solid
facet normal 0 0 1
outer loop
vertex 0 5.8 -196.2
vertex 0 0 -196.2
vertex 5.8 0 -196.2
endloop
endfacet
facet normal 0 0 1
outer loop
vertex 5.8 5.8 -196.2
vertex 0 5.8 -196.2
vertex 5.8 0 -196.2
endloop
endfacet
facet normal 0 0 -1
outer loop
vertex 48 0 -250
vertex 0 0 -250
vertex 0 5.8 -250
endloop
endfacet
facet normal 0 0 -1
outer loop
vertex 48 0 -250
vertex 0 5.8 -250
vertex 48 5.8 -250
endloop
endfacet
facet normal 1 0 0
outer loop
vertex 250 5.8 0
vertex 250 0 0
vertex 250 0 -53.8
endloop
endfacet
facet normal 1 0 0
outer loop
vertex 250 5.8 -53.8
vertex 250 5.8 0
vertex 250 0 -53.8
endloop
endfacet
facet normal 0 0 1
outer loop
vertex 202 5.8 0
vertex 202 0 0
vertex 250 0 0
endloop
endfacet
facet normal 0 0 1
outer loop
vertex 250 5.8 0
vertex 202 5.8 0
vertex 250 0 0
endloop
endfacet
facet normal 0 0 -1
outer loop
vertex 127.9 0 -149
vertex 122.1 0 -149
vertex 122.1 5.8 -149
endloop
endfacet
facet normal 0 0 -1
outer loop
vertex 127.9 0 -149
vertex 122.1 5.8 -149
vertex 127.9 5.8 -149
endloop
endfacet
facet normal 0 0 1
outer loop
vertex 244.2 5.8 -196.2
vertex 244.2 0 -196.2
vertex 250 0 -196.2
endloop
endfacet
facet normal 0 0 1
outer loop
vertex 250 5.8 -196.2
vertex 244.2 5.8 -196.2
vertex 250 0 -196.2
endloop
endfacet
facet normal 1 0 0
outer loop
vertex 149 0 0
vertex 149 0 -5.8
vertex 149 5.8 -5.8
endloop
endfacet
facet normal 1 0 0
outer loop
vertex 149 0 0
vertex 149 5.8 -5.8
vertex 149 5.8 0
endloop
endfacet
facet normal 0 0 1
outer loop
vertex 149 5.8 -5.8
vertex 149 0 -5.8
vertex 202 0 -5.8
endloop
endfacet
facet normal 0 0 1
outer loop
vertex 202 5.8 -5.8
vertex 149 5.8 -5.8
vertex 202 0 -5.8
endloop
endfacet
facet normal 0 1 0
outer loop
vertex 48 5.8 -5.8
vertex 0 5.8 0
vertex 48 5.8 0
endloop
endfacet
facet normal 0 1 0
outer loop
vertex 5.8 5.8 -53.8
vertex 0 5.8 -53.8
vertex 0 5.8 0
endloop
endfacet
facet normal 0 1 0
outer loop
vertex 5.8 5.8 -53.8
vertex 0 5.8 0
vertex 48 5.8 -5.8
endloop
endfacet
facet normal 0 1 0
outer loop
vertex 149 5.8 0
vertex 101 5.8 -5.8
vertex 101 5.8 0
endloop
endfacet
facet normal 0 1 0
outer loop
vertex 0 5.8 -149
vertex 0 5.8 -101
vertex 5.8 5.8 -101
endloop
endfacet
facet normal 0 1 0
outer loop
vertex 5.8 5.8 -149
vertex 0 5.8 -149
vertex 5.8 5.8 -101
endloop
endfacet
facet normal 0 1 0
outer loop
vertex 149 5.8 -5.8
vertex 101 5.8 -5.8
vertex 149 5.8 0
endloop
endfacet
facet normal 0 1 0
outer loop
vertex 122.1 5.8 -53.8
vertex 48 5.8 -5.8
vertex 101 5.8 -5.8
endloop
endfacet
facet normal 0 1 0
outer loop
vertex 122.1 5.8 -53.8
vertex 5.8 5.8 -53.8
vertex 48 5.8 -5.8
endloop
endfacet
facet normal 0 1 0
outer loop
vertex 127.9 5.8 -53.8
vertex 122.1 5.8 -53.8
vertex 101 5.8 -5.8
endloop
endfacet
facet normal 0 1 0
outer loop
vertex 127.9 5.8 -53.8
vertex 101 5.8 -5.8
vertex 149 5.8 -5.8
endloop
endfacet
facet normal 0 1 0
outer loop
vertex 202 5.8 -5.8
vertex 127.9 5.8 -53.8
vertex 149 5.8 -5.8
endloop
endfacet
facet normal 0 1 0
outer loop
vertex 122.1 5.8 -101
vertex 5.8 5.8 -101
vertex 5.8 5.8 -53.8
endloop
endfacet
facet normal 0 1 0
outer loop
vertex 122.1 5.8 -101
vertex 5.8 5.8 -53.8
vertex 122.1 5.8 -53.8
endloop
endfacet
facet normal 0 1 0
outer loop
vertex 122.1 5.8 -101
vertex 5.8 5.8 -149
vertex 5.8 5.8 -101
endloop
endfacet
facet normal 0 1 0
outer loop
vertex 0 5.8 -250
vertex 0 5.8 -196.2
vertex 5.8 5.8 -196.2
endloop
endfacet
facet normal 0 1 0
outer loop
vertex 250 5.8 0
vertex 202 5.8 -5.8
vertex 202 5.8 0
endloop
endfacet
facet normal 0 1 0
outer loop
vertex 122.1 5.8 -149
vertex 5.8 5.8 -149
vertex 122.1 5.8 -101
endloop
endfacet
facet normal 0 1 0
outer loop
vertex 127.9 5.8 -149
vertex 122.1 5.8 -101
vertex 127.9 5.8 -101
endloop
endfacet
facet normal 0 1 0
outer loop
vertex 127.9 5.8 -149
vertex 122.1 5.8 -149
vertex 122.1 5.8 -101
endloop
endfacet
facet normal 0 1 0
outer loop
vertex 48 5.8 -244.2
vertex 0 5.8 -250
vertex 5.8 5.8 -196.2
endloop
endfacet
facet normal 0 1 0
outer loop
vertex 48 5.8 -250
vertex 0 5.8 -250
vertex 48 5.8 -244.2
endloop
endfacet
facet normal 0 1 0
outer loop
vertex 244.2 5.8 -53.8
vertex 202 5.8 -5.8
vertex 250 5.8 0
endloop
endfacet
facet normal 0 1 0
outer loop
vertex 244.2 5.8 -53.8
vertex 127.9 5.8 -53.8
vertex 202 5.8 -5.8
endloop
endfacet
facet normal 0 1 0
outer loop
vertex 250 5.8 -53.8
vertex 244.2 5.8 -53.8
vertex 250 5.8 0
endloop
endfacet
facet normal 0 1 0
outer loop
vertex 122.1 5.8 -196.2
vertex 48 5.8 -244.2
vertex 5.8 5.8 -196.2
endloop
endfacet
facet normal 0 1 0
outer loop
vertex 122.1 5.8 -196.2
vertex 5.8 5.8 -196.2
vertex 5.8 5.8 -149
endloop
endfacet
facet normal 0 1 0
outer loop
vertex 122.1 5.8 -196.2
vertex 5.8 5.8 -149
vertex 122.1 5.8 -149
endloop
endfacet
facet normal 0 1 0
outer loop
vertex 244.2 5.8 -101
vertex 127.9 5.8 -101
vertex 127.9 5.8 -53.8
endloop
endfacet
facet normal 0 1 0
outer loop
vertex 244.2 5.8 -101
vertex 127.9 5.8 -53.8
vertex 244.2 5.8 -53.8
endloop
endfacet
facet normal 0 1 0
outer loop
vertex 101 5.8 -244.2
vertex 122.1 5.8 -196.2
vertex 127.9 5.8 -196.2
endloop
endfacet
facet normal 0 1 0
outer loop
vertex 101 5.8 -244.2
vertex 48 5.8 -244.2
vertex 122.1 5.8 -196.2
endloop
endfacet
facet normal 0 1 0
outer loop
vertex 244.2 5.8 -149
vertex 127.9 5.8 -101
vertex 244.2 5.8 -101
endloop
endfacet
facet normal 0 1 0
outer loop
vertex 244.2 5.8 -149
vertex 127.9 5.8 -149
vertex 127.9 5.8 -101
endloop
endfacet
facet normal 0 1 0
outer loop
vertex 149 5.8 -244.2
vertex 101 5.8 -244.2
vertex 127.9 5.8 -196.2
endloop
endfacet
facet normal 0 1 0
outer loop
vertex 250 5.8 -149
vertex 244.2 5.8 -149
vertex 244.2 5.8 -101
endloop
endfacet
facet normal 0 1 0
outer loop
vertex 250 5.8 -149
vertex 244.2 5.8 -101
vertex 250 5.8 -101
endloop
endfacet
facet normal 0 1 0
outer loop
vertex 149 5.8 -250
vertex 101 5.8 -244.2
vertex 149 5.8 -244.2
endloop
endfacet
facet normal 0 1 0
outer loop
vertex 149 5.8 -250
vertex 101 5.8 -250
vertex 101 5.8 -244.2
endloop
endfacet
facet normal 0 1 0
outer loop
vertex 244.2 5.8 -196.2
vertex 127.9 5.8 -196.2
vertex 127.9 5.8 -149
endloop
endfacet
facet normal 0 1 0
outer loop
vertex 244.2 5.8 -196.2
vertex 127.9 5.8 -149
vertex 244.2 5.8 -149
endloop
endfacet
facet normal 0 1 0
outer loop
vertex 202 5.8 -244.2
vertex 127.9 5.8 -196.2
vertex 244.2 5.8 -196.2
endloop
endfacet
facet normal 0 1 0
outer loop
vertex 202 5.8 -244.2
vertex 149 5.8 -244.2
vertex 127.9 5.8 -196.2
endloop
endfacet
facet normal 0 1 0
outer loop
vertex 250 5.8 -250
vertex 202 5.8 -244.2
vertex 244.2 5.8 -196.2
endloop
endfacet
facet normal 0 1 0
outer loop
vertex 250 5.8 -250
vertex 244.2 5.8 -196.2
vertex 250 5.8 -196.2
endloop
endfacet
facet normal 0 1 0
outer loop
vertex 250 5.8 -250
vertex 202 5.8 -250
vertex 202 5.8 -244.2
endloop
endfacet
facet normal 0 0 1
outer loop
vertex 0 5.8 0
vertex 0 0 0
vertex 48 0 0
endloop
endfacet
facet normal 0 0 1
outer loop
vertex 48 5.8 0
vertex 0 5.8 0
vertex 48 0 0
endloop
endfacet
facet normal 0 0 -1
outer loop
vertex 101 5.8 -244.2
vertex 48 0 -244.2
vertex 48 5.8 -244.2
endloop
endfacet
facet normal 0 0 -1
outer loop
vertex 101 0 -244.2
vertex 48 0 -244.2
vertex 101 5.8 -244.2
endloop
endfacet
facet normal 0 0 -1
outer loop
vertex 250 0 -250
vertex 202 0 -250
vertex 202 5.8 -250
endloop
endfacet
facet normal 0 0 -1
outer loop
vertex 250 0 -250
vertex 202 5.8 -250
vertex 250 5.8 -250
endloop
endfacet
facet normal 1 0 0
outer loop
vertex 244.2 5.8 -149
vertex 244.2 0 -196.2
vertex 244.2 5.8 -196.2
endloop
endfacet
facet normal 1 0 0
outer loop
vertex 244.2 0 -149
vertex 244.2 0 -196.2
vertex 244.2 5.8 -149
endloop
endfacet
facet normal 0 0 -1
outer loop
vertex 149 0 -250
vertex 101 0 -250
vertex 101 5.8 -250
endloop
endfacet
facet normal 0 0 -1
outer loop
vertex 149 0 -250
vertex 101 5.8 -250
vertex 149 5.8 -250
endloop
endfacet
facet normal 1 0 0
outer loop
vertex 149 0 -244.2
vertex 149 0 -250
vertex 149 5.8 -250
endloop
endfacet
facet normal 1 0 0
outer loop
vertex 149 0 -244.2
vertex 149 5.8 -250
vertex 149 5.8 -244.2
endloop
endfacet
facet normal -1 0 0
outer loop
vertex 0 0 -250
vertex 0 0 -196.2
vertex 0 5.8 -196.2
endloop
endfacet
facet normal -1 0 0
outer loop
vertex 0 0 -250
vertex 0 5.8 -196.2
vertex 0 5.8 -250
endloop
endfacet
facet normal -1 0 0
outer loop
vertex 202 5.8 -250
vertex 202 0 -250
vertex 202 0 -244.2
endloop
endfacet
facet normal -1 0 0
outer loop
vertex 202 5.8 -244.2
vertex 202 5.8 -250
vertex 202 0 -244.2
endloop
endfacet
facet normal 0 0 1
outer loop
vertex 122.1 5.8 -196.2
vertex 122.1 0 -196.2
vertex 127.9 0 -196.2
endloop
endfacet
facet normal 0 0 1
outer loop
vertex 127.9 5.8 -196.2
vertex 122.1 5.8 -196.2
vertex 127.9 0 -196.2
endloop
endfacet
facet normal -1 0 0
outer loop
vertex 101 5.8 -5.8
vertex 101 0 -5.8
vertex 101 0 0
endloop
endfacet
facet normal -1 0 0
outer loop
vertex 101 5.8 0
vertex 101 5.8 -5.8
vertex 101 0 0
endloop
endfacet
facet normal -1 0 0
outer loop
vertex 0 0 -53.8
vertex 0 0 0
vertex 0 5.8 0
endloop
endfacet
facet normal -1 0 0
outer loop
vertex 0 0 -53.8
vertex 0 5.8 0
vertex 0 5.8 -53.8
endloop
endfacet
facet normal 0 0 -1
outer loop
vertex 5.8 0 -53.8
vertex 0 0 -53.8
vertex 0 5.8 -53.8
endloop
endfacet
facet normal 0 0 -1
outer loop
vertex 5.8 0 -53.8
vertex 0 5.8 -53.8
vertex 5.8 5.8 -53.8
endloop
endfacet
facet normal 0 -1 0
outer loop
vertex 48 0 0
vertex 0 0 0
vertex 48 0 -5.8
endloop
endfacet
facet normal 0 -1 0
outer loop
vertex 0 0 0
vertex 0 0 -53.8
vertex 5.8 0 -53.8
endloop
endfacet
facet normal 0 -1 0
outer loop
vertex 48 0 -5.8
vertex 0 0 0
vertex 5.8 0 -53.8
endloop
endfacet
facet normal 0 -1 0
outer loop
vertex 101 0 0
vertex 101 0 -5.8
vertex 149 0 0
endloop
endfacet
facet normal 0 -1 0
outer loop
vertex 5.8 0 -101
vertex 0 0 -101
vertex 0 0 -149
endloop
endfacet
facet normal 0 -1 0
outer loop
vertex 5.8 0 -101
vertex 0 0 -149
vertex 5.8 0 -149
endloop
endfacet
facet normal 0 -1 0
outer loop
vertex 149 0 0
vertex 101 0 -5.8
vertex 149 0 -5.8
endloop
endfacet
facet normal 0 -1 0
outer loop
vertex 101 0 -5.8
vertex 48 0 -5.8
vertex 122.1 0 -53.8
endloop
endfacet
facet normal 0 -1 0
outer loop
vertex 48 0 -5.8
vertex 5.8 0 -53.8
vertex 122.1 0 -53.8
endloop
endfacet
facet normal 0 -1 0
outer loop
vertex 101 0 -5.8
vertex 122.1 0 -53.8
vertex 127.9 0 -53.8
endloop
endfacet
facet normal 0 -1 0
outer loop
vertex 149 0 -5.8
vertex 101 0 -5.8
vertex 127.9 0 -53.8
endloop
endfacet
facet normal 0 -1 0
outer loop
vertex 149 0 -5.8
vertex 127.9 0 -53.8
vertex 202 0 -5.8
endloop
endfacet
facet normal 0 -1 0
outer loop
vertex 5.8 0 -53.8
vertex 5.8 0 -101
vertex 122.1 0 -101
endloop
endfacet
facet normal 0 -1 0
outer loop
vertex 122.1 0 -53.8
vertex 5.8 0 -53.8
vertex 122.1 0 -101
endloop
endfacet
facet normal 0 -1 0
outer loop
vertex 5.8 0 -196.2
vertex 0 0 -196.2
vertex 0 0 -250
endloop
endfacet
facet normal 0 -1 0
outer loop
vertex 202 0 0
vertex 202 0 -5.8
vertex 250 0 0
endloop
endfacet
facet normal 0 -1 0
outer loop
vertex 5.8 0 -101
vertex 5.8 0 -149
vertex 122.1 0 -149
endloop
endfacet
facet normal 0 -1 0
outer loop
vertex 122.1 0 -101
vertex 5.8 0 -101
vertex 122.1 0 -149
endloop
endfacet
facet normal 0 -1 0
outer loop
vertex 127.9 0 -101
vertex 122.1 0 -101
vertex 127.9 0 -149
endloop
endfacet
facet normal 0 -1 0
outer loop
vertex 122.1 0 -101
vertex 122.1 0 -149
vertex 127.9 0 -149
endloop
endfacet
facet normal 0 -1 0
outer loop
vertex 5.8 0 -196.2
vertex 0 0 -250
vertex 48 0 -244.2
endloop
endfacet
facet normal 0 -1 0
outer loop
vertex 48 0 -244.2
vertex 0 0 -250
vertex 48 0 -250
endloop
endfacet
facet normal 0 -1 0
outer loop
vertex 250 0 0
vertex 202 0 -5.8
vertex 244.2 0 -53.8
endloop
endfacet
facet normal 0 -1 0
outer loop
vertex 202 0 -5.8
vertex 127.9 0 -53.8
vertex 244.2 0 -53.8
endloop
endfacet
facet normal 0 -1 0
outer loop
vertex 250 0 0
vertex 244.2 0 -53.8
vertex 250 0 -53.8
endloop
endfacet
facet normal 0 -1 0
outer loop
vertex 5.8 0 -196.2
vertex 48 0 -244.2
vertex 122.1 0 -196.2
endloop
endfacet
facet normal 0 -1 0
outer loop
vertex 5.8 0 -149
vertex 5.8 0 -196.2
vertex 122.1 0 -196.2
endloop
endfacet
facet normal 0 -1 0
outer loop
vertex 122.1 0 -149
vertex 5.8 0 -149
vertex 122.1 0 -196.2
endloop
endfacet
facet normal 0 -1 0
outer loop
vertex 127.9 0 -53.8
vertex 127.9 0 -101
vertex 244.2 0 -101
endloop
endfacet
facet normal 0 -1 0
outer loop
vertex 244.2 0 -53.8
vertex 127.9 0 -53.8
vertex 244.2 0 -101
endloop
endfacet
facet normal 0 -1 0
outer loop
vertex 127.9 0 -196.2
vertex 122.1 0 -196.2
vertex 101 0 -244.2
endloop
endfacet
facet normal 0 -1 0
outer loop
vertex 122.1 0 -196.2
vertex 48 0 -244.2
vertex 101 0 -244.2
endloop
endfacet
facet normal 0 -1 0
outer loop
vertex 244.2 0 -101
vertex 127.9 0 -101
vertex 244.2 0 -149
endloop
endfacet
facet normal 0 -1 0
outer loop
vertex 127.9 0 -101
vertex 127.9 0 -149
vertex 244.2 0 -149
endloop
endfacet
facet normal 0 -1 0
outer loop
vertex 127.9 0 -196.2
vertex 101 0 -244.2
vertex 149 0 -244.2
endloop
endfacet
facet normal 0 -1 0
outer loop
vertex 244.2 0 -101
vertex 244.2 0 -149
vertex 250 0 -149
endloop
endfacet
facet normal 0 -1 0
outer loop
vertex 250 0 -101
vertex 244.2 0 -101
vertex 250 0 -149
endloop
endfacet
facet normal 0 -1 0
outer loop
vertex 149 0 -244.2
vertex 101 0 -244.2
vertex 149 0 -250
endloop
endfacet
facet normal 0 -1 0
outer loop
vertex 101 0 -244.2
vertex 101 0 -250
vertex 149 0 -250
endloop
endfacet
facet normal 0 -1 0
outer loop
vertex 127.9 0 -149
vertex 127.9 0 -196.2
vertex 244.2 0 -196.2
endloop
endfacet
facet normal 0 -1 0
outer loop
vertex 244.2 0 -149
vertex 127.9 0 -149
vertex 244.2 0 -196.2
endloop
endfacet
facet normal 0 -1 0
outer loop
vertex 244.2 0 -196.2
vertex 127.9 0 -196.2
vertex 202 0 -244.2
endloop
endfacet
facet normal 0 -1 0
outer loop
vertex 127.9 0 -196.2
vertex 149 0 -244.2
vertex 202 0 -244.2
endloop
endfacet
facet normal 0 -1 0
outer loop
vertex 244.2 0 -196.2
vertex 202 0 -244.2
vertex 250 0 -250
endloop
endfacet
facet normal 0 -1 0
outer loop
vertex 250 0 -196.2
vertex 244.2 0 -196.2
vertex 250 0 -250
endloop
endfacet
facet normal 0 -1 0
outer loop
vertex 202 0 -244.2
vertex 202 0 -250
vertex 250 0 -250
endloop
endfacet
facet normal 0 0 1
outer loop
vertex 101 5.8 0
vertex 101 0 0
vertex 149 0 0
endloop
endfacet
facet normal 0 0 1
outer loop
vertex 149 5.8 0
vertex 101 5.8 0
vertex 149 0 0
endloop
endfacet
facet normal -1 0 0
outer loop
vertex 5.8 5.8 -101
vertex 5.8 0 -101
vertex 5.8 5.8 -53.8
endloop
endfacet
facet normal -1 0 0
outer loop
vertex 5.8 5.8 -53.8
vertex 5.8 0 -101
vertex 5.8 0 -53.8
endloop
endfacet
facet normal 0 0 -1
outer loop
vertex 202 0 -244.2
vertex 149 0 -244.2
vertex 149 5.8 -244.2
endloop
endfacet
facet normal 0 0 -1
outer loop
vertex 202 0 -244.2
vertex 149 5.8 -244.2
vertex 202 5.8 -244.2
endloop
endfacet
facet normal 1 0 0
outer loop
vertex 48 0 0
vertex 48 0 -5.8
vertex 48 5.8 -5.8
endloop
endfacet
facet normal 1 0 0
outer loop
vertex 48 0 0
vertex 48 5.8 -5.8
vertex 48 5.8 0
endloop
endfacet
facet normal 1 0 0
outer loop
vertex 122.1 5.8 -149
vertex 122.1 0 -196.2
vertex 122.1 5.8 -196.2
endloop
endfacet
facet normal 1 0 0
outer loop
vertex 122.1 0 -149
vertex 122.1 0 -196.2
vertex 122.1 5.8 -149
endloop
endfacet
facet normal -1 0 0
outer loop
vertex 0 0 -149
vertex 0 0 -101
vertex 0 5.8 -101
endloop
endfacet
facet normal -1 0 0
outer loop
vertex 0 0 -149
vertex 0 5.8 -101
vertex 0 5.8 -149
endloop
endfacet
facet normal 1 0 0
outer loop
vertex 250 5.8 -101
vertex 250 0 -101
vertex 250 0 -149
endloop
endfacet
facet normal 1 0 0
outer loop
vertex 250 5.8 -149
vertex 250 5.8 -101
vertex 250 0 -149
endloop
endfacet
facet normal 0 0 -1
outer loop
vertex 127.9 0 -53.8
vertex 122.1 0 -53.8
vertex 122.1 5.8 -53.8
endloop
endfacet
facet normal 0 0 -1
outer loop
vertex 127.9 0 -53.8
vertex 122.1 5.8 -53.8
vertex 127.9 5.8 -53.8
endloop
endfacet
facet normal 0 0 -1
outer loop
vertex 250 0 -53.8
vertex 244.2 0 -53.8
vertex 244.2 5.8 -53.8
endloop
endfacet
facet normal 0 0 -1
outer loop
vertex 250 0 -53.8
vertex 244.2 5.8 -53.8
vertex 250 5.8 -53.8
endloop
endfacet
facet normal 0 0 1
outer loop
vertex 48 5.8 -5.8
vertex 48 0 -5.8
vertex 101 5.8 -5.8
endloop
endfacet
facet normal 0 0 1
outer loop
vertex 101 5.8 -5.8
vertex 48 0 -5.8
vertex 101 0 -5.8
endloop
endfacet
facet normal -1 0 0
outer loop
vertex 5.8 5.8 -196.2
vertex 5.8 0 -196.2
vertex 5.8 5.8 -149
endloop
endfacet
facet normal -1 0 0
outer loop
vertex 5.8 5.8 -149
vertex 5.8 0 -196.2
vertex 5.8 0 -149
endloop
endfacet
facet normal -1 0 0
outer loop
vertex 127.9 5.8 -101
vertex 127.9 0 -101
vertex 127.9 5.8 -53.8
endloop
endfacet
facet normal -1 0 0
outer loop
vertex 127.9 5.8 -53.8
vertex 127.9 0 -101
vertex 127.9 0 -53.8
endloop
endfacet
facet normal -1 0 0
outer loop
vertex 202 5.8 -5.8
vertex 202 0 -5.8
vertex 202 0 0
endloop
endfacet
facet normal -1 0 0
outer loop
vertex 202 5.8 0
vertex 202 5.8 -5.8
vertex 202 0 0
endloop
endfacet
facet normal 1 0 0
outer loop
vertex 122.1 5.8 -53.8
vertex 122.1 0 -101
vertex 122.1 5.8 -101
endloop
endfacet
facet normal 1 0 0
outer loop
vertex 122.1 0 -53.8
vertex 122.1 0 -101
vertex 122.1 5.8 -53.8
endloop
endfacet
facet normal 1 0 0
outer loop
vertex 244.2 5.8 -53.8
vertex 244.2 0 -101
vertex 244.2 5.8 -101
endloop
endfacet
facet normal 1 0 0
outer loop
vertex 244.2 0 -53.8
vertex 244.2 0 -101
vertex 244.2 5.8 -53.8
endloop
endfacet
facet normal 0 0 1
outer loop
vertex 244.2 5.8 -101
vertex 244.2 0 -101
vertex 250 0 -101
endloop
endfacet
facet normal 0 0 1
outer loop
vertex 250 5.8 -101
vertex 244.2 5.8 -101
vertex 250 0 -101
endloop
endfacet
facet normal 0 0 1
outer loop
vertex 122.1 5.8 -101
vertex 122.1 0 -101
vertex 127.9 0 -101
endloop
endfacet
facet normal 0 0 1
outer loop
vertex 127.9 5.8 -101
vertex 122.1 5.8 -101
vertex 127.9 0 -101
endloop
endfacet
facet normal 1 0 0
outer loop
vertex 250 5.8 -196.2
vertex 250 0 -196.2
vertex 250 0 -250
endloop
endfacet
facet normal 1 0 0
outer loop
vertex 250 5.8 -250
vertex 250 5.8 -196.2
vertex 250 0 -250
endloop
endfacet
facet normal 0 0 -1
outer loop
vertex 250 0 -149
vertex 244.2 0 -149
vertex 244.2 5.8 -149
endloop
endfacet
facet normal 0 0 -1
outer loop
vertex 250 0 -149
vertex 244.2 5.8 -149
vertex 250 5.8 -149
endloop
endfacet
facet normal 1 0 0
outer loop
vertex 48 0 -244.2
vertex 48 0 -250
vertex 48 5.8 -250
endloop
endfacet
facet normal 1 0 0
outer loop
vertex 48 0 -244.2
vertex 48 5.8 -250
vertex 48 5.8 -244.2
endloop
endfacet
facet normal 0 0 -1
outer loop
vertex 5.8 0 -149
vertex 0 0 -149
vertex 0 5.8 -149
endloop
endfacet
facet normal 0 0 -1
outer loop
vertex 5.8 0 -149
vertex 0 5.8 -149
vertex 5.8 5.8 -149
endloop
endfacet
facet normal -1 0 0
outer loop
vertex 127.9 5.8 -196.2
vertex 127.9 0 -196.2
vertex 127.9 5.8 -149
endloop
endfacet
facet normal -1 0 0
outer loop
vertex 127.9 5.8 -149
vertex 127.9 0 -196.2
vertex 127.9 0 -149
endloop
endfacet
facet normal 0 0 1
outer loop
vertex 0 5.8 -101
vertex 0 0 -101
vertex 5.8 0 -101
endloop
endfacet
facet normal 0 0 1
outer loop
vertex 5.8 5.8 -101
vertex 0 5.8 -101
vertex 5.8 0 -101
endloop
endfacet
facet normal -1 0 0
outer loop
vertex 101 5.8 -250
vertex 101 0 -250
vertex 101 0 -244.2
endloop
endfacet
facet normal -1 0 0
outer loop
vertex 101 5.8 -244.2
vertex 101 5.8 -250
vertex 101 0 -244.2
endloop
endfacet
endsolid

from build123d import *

# Parameters (mm, degrees)
SKETCH_1_W          = 250
SKETCH_1_H          = 250
EXTRUDE_1_DEPTH     = 5.8
CUT_EXTRUDE_1_REACH = 355.601
SKETCH_2_W          = 53
SKETCH_2_H          = 5.8
SKETCH_2_W_2        = 5.8
SKETCH_2_H_2        = 47.2


with BuildPart() as part:
    # Эскиз1 → Бобышка-Вытянуть1 (new body)
    with BuildSketch(Plane(origin=(0, 0, 0), x_dir=(1, 0, 0), z_dir=(0, 1, 0))):
        with Locations((125, 125)):
            Rectangle(SKETCH_1_W, SKETCH_1_H)
    extrude(amount=EXTRUDE_1_DEPTH)

    # Эскиз2 → Вырез-Вытянуть1 (cut, up to next)
    with BuildSketch(Plane.XZ, mode=Mode.PRIVATE) as cut_extrude_1_sk1:
        with Locations((74.5, -2.9)):
            Rectangle(SKETCH_2_W, SKETCH_2_H)
    cut_extrude_1_tool1 = extrude(cut_extrude_1_sk1.sketch, amount=-CUT_EXTRUDE_1_REACH, mode=Mode.PRIVATE) & part.part
    # Эскиз2 → Вырез-Вытянуть1 (cut, up to next)
    with BuildSketch(Plane.XZ, mode=Mode.PRIVATE) as cut_extrude_1_sk2:
        with Locations((175.5, -2.9)):
            Rectangle(SKETCH_2_W, SKETCH_2_H)
    cut_extrude_1_tool2 = extrude(cut_extrude_1_sk2.sketch, amount=-CUT_EXTRUDE_1_REACH, mode=Mode.PRIVATE) & part.part
    # Эскиз2 → Вырез-Вытянуть1 (cut, up to next)
    with BuildSketch(Plane.XZ, mode=Mode.PRIVATE) as cut_extrude_1_sk3:
        with Locations((125, -77.4)):
            Rectangle(SKETCH_2_W_2, SKETCH_2_H_2)
    cut_extrude_1_tool3 = extrude(cut_extrude_1_sk3.sketch, amount=-CUT_EXTRUDE_1_REACH, mode=Mode.PRIVATE) & part.part
    # Эскиз2 → Вырез-Вытянуть1 (cut, up to next)
    with BuildSketch(Plane.XZ, mode=Mode.PRIVATE) as cut_extrude_1_sk4:
        with Locations((2.9, -77.4)):
            Rectangle(SKETCH_2_W_2, SKETCH_2_H_2)
    cut_extrude_1_tool4 = extrude(cut_extrude_1_sk4.sketch, amount=-CUT_EXTRUDE_1_REACH, mode=Mode.PRIVATE) & part.part
    # Эскиз2 → Вырез-Вытянуть1 (cut, up to next)
    with BuildSketch(Plane.XZ, mode=Mode.PRIVATE) as cut_extrude_1_sk5:
        with Locations((2.9, -172.6)):
            Rectangle(SKETCH_2_W_2, SKETCH_2_H_2)
    cut_extrude_1_tool5 = extrude(cut_extrude_1_sk5.sketch, amount=-CUT_EXTRUDE_1_REACH, mode=Mode.PRIVATE) & part.part
    # Эскиз2 → Вырез-Вытянуть1 (cut, up to next)
    with BuildSketch(Plane.XZ, mode=Mode.PRIVATE) as cut_extrude_1_sk6:
        with Locations((125, -172.6)):
            Rectangle(SKETCH_2_W_2, SKETCH_2_H_2)
    cut_extrude_1_tool6 = extrude(cut_extrude_1_sk6.sketch, amount=-CUT_EXTRUDE_1_REACH, mode=Mode.PRIVATE) & part.part
    # Эскиз2 → Вырез-Вытянуть1 (cut, up to next)
    with BuildSketch(Plane.XZ, mode=Mode.PRIVATE) as cut_extrude_1_sk7:
        with Locations((74.5, -247.1)):
            Rectangle(SKETCH_2_W, SKETCH_2_H)
    cut_extrude_1_tool7 = extrude(cut_extrude_1_sk7.sketch, amount=-CUT_EXTRUDE_1_REACH, mode=Mode.PRIVATE) & part.part
    # Эскиз2 → Вырез-Вытянуть1 (cut, up to next)
    with BuildSketch(Plane.XZ, mode=Mode.PRIVATE) as cut_extrude_1_sk8:
        with Locations((175.5, -247.1)):
            Rectangle(SKETCH_2_W, SKETCH_2_H)
    cut_extrude_1_tool8 = extrude(cut_extrude_1_sk8.sketch, amount=-CUT_EXTRUDE_1_REACH, mode=Mode.PRIVATE) & part.part
    # Эскиз2 → Вырез-Вытянуть1 (cut, up to next)
    with BuildSketch(Plane.XZ, mode=Mode.PRIVATE) as cut_extrude_1_sk9:
        with Locations((247.1, -172.6)):
            Rectangle(SKETCH_2_W_2, SKETCH_2_H_2)
    cut_extrude_1_tool9 = extrude(cut_extrude_1_sk9.sketch, amount=-CUT_EXTRUDE_1_REACH, mode=Mode.PRIVATE) & part.part
    # Эскиз2 → Вырез-Вытянуть1 (cut, up to next)
    with BuildSketch(Plane.XZ, mode=Mode.PRIVATE) as cut_extrude_1_sk10:
        with Locations((247.1, -77.4)):
            Rectangle(SKETCH_2_W_2, SKETCH_2_H_2)
    cut_extrude_1_tool10 = extrude(cut_extrude_1_sk10.sketch, amount=-CUT_EXTRUDE_1_REACH, mode=Mode.PRIVATE) & part.part
    add(cut_extrude_1_tool1.solids().sort_by_distance((74.5, 0, -2.9))[0], mode=Mode.SUBTRACT)
    add(cut_extrude_1_tool2.solids().sort_by_distance((175.5, 0, -2.9))[0], mode=Mode.SUBTRACT)
    add(cut_extrude_1_tool3.solids().sort_by_distance((125, 0, -77.4))[0], mode=Mode.SUBTRACT)
    add(cut_extrude_1_tool4.solids().sort_by_distance((2.9, 0, -77.4))[0], mode=Mode.SUBTRACT)
    add(cut_extrude_1_tool5.solids().sort_by_distance((2.9, 0, -172.6))[0], mode=Mode.SUBTRACT)
    add(cut_extrude_1_tool6.solids().sort_by_distance((125, 0, -172.6))[0], mode=Mode.SUBTRACT)
    add(cut_extrude_1_tool7.solids().sort_by_distance((74.5, 0, -247.1))[0], mode=Mode.SUBTRACT)
    add(cut_extrude_1_tool8.solids().sort_by_distance((175.5, 0, -247.1))[0], mode=Mode.SUBTRACT)
    add(cut_extrude_1_tool9.solids().sort_by_distance((247.1, 0, -172.6))[0], mode=Mode.SUBTRACT)
    add(cut_extrude_1_tool10.solids().sort_by_distance((247.1, 0, -77.4))[0], mode=Mode.SUBTRACT)


solid = part.part
